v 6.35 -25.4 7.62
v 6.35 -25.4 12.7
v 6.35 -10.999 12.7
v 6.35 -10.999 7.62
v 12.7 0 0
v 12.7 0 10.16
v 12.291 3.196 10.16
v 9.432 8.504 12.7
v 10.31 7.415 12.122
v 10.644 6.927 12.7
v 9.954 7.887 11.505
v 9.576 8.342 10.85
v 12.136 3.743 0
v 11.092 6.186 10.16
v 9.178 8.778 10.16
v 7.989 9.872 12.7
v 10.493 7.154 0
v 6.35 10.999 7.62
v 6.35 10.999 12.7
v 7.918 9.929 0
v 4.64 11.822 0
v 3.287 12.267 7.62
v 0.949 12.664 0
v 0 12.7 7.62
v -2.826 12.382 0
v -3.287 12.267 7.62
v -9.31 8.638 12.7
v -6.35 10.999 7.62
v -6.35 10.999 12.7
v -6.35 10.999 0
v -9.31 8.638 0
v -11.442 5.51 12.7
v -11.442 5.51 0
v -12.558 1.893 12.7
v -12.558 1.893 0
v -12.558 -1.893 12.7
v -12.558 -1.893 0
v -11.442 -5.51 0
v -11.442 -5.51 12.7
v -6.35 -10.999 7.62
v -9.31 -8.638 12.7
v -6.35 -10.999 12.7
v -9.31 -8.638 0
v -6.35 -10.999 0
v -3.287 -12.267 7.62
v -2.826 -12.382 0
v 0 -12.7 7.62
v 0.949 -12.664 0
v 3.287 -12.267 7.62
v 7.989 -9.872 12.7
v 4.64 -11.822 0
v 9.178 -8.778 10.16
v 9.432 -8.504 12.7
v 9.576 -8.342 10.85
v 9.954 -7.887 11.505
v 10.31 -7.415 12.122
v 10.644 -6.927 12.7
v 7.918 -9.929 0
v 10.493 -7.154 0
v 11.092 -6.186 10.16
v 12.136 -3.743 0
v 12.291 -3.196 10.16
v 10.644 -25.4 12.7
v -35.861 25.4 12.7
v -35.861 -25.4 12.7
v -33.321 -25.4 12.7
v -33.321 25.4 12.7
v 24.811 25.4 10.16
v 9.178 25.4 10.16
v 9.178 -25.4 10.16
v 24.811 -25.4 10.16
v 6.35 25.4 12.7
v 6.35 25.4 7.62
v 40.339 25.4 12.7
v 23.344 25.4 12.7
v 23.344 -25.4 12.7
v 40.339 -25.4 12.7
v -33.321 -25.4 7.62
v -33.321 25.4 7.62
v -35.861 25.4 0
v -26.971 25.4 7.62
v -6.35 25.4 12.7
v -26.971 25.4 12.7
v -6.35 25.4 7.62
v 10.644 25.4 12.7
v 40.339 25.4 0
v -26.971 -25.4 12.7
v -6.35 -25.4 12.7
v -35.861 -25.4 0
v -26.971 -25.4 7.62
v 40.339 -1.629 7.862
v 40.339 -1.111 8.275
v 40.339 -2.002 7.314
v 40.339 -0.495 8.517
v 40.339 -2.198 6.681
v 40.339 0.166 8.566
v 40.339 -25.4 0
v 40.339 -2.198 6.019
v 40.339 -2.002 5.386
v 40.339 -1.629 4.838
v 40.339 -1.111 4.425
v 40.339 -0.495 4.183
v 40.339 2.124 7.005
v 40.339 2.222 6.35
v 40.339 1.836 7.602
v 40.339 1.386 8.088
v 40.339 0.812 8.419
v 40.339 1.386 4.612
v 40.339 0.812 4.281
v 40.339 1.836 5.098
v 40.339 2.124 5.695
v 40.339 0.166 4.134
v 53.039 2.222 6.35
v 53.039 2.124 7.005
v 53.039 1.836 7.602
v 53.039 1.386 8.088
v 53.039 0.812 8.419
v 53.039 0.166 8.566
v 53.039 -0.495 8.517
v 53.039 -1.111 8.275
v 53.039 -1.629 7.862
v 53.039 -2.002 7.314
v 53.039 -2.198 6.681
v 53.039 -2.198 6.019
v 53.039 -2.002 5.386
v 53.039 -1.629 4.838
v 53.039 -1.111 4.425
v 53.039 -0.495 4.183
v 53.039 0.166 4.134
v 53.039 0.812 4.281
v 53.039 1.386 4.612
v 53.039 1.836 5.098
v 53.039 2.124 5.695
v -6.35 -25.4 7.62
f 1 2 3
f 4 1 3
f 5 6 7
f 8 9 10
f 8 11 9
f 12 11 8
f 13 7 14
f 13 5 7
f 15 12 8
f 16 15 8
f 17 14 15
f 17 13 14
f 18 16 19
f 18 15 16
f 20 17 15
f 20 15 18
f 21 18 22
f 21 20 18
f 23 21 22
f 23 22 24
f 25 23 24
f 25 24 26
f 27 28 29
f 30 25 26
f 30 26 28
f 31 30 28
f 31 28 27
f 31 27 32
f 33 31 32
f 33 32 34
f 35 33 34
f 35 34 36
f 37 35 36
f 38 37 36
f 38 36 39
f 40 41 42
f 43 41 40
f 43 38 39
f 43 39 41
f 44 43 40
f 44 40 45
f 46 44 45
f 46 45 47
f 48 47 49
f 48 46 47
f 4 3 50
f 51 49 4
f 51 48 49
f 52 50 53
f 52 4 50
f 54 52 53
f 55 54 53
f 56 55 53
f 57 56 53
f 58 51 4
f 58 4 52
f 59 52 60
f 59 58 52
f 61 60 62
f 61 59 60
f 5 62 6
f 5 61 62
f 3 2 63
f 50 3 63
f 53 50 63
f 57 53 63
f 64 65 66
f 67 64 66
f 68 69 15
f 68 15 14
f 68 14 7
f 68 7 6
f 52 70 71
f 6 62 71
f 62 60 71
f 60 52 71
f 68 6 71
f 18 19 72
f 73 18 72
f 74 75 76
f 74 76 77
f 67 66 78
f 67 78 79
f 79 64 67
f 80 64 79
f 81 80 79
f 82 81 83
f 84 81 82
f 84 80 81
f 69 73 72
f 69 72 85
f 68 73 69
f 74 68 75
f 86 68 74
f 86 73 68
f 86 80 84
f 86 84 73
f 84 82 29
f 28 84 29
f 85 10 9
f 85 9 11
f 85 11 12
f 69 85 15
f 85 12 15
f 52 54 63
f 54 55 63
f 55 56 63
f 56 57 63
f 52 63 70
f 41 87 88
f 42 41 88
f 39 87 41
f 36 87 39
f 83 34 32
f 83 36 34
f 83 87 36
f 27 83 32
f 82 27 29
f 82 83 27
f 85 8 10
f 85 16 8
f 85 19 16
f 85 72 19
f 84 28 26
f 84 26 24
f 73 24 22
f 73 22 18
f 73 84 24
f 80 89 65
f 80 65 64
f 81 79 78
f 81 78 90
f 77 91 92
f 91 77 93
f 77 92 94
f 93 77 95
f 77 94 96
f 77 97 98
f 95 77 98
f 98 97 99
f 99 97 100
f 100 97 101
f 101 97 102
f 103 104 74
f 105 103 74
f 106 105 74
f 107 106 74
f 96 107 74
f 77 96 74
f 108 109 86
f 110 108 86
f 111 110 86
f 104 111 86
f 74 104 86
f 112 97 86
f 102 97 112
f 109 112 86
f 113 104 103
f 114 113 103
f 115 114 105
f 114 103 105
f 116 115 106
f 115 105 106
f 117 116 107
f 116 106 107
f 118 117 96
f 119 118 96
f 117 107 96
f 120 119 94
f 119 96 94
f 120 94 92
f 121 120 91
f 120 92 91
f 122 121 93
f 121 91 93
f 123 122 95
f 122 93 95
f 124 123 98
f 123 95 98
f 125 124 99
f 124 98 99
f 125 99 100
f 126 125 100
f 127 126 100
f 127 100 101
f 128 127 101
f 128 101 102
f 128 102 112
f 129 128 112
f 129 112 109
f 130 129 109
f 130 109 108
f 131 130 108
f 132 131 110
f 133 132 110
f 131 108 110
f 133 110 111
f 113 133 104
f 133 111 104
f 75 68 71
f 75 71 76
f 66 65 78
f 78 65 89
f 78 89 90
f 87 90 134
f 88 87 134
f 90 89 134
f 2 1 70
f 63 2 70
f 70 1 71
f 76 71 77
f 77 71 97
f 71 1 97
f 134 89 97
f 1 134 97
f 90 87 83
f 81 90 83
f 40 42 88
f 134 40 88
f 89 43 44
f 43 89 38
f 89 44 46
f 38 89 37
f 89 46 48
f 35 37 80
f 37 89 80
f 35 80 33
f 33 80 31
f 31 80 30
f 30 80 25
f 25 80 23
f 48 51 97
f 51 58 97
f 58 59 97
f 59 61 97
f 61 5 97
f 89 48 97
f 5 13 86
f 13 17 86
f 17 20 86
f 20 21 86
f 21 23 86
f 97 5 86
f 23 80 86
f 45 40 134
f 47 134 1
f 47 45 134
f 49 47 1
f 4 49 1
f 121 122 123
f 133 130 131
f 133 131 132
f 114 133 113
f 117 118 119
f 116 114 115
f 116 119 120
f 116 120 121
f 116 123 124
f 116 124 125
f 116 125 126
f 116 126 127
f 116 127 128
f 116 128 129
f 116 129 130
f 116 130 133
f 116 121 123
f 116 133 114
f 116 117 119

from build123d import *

# Parameters (mm, degrees)
F0_W     = 76.2
F0_H     = 50.8
F0_R     = 12.7
F1_DEPTH = 12.7
F2_W     = 6.35
F2_H     = 50.8
F3_DEPTH = 5.08
F5_DEPTH = 50.801
F6_R     = 2.2225
F7_DEPTH = 12.7


with BuildPart() as f1:
    # F0 (on Top) → F1 (new body)
    with BuildSketch(Plane.XY):
        with Locations((2.2386768513, 0)):
            Rectangle(F0_W, F0_H)
        Circle(F0_R, mode=Mode.SUBTRACT)
    extrude(amount=F1_DEPTH)

    # F2 (on face) → F3 (cut)
    with BuildSketch(Plane.XY.offset(12.7)):
        with Locations((-30.1463231487, 0)):
            Rectangle(F2_W, F2_H)
        with BuildLine():
            Line((-6.35, -10.9985226281), (-6.35, -25.4))
            Line((-6.35, -25.4), (6.35, -25.4))
            Line((6.35, -25.4), (6.35, -10.9985226281))
            ThreePointArc((6.35, -10.9985226281), (0, -12.7), (-6.35, -10.9985226281))
        make_face()
        with BuildLine():
            Line((6.35, 25.4), (-6.35, 25.4))
            Line((-6.35, 25.4), (-6.35, 10.9985226281))
            ThreePointArc((-6.35, 10.9985226281), (0, 12.7), (6.35, 10.9985226281))
            Line((6.35, 10.9985226281), (6.35, 25.4))
        make_face()
    extrude(amount=-F3_DEPTH, mode=Mode.SUBTRACT)

    # F4 (on face) → F5 (cut, through all)
    with BuildSketch(Plane.XZ.offset(25.4)):
        Polygon((23.3443384257, 12.7), (10.6443384257, 12.7), (9.1778687419, 10.16), (24.8108081094, 10.16), align=None)
    extrude(amount=-F5_DEPTH, mode=Mode.SUBTRACT)

    # F6 (on face) → F7 (join)
    with BuildSketch(Plane.YZ.offset(40.3386768513)):
        with Locations((0, 6.35)):
            Circle(F6_R)
    extrude(amount=F7_DEPTH)


solid = f1.part
